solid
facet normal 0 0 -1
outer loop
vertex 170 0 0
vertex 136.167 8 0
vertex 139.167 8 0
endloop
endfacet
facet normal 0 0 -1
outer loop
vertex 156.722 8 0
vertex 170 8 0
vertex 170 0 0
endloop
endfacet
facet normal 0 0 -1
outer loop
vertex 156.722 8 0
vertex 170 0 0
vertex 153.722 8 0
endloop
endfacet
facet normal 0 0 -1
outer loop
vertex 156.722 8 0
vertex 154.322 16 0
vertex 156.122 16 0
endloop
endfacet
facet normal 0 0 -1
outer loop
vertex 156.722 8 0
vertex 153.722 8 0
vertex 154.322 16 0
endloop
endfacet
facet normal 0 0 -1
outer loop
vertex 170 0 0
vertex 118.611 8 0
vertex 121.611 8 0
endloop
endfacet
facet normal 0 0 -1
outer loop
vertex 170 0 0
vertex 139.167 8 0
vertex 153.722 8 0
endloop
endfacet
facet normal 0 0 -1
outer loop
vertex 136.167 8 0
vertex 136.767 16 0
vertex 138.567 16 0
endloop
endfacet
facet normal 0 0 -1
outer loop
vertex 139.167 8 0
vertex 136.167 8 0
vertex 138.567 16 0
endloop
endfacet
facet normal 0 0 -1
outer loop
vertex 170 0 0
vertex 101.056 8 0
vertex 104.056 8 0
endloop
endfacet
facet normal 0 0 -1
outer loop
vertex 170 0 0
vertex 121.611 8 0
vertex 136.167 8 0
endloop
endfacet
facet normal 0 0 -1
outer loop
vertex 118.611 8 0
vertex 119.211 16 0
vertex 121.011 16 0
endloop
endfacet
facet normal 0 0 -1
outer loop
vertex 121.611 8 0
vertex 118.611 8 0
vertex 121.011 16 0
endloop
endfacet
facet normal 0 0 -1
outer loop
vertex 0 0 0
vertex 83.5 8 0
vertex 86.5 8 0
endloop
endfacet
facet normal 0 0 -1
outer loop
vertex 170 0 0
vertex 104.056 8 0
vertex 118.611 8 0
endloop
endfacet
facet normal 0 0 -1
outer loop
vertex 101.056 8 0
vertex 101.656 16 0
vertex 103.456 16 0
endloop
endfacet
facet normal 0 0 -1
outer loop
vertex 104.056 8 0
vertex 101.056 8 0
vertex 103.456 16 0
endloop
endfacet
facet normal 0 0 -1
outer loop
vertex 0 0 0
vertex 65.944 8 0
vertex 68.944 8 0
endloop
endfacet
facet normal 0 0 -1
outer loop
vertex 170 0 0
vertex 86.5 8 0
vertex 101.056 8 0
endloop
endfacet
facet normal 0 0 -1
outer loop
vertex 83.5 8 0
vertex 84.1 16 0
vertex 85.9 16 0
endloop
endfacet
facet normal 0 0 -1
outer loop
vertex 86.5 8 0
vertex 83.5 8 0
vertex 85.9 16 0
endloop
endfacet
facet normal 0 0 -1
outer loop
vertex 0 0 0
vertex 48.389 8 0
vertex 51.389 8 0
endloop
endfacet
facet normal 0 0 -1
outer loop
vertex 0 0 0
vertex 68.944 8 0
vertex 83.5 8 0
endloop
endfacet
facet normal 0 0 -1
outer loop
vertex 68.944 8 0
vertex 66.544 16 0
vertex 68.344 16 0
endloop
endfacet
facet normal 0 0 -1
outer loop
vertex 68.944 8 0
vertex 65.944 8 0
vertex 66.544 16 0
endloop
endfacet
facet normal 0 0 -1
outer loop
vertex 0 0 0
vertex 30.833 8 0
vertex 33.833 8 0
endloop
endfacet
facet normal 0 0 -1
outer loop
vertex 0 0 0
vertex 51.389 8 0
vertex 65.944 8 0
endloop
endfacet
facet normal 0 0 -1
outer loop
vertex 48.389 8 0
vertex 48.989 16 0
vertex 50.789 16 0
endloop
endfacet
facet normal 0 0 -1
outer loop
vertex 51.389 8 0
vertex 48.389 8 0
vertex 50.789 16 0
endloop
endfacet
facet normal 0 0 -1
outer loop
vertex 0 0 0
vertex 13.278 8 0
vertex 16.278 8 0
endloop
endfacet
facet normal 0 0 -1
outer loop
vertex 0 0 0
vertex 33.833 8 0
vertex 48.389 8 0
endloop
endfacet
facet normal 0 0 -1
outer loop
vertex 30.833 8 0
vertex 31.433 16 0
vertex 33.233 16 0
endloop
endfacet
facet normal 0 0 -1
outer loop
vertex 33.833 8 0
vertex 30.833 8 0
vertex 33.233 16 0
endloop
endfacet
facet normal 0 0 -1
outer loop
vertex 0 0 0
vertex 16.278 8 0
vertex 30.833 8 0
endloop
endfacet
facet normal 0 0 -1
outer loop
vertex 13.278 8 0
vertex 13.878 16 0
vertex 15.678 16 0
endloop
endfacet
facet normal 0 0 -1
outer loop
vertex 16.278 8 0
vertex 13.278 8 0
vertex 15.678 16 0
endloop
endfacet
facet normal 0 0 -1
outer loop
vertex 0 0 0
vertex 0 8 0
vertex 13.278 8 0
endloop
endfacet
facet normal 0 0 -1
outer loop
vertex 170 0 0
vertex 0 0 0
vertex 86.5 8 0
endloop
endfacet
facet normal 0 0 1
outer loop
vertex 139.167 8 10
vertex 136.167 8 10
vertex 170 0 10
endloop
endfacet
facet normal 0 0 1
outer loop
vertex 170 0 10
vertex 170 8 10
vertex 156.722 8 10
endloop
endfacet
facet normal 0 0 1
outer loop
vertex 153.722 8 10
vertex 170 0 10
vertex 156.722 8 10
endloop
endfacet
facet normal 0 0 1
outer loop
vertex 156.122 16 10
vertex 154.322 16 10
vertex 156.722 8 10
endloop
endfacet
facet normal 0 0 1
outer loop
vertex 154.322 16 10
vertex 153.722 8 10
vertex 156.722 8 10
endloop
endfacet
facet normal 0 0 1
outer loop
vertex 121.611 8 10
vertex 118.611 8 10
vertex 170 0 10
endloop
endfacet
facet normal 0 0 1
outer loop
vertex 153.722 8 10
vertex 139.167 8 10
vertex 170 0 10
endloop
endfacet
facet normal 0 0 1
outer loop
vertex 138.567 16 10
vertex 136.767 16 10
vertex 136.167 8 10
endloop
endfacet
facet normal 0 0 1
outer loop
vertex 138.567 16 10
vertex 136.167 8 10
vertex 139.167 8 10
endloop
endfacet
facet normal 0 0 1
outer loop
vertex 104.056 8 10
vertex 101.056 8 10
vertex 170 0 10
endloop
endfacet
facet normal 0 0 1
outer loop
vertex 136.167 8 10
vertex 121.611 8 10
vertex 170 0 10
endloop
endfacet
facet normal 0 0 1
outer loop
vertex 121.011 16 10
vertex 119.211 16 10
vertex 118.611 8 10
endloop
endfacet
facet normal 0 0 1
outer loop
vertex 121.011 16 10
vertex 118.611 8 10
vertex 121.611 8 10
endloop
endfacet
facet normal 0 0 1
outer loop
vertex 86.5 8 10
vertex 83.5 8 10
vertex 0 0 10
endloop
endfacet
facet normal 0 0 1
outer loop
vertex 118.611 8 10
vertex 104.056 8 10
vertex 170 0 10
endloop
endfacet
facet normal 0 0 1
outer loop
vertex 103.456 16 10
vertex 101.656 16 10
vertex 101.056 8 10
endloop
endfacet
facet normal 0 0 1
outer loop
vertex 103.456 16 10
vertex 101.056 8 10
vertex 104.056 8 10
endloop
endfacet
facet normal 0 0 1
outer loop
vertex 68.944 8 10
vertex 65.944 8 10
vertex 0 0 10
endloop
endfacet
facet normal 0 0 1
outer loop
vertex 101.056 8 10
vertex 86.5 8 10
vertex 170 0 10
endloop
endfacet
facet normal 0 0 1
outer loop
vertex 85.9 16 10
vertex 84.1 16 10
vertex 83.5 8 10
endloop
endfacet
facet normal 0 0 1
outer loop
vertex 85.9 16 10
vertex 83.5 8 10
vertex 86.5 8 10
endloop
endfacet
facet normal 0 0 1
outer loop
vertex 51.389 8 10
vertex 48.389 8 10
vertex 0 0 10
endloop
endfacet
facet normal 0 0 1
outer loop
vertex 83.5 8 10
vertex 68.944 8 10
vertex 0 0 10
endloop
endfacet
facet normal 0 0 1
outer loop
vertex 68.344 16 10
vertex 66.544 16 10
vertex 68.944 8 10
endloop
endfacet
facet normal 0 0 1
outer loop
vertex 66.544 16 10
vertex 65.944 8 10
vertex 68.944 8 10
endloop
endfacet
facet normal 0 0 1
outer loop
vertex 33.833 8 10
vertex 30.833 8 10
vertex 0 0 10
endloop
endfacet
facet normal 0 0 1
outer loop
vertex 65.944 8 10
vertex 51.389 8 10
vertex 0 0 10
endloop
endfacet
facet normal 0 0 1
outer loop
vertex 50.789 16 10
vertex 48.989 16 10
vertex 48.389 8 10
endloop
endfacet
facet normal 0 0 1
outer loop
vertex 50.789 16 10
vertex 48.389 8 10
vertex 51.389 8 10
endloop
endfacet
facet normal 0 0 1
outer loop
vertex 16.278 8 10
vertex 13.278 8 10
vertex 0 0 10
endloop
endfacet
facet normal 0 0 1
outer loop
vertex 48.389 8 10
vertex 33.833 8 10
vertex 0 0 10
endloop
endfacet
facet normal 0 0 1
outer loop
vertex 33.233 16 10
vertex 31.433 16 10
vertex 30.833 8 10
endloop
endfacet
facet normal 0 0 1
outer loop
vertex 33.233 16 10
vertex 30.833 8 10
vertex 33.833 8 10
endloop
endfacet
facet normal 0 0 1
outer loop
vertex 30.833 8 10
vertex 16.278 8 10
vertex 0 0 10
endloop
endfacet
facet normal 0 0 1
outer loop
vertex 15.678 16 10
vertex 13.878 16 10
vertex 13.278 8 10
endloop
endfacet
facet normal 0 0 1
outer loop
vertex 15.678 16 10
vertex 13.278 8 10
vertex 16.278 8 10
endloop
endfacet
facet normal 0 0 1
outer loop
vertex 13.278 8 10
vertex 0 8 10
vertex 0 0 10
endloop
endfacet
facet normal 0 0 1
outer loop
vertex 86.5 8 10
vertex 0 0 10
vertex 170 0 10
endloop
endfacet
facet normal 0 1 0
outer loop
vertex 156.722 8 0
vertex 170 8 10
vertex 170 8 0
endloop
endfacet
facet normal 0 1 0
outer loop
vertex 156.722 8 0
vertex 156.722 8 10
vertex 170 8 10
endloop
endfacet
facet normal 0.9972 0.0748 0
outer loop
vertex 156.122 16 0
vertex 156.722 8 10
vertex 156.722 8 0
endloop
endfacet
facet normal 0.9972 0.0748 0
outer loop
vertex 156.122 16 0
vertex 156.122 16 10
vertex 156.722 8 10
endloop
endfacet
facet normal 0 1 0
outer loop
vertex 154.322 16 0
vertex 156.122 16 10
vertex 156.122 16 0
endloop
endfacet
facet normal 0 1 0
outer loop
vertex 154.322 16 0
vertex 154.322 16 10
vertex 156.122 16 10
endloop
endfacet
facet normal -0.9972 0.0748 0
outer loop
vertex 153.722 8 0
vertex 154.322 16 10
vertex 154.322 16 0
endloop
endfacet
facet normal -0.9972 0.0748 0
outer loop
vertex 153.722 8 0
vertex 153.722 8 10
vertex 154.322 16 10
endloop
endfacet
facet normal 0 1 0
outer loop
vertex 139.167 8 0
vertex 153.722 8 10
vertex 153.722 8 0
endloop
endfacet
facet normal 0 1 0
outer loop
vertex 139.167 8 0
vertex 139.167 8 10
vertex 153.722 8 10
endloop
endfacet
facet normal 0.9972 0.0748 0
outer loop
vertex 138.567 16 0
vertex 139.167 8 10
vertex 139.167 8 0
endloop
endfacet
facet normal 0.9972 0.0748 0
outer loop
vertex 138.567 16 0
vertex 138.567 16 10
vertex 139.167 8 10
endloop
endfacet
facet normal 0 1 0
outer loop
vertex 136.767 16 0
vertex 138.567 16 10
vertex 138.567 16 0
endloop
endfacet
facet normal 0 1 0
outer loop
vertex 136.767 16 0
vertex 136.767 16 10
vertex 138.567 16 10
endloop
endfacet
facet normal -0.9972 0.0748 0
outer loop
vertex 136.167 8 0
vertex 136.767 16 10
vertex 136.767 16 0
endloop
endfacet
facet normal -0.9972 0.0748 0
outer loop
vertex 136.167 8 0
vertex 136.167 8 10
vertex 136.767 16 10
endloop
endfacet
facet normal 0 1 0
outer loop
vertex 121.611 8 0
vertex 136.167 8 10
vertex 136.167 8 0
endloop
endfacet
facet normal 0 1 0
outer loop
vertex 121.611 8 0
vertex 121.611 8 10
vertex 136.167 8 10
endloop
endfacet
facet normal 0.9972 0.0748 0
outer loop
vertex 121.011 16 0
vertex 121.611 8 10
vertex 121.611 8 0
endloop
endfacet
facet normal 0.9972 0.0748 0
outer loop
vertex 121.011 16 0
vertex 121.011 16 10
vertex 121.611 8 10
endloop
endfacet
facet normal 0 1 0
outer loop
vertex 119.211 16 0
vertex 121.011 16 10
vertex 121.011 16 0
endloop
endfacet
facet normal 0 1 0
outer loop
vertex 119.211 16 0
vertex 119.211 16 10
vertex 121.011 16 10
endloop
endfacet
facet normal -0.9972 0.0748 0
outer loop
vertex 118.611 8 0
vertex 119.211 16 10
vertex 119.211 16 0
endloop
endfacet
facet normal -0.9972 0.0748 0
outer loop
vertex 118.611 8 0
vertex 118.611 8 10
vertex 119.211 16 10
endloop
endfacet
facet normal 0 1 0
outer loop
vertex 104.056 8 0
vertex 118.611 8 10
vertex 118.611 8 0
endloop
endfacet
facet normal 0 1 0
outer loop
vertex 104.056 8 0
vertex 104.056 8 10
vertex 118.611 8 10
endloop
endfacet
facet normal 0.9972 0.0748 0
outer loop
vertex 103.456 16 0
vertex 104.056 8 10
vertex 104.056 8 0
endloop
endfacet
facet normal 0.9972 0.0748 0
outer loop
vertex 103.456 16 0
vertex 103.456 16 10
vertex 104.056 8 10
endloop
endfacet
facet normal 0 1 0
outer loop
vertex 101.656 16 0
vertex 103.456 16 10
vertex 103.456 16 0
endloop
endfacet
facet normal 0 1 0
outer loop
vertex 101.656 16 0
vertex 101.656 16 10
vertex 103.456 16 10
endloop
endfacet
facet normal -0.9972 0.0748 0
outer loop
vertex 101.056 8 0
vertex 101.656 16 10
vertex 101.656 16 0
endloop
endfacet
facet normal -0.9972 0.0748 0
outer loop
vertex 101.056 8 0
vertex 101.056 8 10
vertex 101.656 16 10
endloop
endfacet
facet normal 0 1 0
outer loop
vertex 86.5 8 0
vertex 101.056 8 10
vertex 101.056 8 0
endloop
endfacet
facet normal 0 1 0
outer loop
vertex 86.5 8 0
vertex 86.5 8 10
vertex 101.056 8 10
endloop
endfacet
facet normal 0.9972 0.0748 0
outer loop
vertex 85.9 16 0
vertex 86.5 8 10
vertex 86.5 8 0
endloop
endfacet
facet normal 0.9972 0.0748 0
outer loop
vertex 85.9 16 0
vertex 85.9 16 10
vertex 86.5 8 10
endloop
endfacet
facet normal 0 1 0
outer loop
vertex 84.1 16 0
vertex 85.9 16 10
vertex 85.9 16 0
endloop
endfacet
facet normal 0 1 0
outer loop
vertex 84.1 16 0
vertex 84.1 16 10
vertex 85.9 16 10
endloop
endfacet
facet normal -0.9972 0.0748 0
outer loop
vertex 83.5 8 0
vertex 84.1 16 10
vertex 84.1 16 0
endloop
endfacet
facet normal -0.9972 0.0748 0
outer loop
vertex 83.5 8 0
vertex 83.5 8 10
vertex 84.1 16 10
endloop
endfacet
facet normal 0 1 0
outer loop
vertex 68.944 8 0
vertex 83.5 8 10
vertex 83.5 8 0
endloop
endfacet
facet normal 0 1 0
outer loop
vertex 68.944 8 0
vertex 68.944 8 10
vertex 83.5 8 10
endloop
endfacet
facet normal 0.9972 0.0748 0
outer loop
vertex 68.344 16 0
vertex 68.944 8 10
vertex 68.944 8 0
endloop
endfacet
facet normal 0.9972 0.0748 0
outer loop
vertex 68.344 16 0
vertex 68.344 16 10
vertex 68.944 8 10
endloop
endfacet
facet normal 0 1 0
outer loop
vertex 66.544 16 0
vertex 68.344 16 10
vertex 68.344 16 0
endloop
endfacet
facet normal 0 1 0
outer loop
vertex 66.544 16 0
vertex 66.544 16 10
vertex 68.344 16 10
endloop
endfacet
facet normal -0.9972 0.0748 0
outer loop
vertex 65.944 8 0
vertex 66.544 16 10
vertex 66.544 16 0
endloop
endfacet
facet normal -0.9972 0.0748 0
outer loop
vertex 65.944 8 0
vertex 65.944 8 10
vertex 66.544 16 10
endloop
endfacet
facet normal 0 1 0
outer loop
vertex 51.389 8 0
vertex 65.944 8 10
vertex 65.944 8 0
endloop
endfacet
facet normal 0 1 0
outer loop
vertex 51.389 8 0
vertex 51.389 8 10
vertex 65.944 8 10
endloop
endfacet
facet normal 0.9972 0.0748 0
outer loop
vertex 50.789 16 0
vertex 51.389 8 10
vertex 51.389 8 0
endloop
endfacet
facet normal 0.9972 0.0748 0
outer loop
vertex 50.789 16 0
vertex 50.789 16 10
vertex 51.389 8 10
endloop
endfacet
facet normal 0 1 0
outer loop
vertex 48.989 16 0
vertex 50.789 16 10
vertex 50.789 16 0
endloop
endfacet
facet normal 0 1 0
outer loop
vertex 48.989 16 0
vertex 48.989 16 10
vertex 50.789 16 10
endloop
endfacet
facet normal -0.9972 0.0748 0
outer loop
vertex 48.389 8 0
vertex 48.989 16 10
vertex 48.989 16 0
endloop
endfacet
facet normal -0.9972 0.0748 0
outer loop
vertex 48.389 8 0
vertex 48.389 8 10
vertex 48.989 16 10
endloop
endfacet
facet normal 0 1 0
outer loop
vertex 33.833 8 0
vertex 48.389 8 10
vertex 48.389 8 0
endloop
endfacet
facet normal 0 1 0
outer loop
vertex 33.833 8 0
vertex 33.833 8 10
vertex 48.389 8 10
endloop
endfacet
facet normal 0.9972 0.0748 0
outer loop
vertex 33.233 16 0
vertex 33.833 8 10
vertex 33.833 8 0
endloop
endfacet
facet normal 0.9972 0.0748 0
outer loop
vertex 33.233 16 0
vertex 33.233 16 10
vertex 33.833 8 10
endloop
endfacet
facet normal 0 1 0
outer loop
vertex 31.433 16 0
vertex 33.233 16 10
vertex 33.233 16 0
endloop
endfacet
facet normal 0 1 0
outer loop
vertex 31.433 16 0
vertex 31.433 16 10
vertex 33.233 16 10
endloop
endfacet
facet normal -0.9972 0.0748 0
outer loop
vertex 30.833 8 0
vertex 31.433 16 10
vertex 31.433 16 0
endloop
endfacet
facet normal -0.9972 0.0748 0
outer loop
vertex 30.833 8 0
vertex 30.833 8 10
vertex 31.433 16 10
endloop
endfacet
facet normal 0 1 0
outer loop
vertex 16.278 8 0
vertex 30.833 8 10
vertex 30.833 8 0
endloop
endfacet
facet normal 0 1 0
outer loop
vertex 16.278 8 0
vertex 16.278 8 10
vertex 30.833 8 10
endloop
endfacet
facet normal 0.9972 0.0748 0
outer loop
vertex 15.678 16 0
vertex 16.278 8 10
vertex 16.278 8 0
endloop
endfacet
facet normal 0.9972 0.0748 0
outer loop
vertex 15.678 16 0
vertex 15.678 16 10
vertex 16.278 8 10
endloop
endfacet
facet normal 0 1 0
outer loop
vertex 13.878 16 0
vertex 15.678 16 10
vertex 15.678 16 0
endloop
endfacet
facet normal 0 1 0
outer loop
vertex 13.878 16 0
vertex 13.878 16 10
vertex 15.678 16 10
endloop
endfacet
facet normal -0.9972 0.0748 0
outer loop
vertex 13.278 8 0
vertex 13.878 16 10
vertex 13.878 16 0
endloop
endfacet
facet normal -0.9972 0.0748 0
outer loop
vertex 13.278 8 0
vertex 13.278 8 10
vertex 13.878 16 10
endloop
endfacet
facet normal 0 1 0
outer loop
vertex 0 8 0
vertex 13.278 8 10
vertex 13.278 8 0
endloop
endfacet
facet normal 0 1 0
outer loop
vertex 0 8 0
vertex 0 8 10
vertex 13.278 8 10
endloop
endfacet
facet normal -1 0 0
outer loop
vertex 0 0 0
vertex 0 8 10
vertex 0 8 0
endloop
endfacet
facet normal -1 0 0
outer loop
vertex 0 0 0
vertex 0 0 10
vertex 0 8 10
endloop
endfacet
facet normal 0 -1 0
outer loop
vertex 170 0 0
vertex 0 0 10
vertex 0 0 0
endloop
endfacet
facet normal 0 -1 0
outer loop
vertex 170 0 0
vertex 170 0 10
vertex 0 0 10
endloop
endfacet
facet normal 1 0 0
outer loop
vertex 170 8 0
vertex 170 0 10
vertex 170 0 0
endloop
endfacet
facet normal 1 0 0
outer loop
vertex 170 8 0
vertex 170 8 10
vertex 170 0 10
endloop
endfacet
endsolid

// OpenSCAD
$fn = 32;

// ----------------------------------------------------------------------
// Gear rack: 9 teeth on a 170 mm bar, pitch 17.56 mm
// ----------------------------------------------------------------------

// --- parameters (mm) ---
profile_height = 10;      // extrusion height
profile_points = 40;      // points of the closed outline

profile = [[0, 0], [170, 0], [170, 8], [156.722, 8], [156.122, 16], [154.322, 16], [153.722, 8], [139.167, 8], [138.567, 16], [136.767, 16], [136.167, 8], [121.611, 8], [121.011, 16], [119.211, 16], [118.611, 8], [104.056, 8], [103.456, 16], [101.656, 16], [101.056, 8], [86.5, 8], [85.9, 16], [84.1, 16], [83.5, 8], [68.944, 8], [68.344, 16], [66.544, 16], [65.944, 8], [51.389, 8], [50.789, 16], [48.989, 16], [48.389, 8], [33.833, 8], [33.233, 16], [31.433, 16], [30.833, 8], [16.278, 8], [15.678, 16], [13.878, 16], [13.278, 8], [0, 8]];  // single closed polygon, 40 points, counter clockwise

// --- the one profile operation ---
linear_extrude(height = profile_height) polygon(points = profile);
